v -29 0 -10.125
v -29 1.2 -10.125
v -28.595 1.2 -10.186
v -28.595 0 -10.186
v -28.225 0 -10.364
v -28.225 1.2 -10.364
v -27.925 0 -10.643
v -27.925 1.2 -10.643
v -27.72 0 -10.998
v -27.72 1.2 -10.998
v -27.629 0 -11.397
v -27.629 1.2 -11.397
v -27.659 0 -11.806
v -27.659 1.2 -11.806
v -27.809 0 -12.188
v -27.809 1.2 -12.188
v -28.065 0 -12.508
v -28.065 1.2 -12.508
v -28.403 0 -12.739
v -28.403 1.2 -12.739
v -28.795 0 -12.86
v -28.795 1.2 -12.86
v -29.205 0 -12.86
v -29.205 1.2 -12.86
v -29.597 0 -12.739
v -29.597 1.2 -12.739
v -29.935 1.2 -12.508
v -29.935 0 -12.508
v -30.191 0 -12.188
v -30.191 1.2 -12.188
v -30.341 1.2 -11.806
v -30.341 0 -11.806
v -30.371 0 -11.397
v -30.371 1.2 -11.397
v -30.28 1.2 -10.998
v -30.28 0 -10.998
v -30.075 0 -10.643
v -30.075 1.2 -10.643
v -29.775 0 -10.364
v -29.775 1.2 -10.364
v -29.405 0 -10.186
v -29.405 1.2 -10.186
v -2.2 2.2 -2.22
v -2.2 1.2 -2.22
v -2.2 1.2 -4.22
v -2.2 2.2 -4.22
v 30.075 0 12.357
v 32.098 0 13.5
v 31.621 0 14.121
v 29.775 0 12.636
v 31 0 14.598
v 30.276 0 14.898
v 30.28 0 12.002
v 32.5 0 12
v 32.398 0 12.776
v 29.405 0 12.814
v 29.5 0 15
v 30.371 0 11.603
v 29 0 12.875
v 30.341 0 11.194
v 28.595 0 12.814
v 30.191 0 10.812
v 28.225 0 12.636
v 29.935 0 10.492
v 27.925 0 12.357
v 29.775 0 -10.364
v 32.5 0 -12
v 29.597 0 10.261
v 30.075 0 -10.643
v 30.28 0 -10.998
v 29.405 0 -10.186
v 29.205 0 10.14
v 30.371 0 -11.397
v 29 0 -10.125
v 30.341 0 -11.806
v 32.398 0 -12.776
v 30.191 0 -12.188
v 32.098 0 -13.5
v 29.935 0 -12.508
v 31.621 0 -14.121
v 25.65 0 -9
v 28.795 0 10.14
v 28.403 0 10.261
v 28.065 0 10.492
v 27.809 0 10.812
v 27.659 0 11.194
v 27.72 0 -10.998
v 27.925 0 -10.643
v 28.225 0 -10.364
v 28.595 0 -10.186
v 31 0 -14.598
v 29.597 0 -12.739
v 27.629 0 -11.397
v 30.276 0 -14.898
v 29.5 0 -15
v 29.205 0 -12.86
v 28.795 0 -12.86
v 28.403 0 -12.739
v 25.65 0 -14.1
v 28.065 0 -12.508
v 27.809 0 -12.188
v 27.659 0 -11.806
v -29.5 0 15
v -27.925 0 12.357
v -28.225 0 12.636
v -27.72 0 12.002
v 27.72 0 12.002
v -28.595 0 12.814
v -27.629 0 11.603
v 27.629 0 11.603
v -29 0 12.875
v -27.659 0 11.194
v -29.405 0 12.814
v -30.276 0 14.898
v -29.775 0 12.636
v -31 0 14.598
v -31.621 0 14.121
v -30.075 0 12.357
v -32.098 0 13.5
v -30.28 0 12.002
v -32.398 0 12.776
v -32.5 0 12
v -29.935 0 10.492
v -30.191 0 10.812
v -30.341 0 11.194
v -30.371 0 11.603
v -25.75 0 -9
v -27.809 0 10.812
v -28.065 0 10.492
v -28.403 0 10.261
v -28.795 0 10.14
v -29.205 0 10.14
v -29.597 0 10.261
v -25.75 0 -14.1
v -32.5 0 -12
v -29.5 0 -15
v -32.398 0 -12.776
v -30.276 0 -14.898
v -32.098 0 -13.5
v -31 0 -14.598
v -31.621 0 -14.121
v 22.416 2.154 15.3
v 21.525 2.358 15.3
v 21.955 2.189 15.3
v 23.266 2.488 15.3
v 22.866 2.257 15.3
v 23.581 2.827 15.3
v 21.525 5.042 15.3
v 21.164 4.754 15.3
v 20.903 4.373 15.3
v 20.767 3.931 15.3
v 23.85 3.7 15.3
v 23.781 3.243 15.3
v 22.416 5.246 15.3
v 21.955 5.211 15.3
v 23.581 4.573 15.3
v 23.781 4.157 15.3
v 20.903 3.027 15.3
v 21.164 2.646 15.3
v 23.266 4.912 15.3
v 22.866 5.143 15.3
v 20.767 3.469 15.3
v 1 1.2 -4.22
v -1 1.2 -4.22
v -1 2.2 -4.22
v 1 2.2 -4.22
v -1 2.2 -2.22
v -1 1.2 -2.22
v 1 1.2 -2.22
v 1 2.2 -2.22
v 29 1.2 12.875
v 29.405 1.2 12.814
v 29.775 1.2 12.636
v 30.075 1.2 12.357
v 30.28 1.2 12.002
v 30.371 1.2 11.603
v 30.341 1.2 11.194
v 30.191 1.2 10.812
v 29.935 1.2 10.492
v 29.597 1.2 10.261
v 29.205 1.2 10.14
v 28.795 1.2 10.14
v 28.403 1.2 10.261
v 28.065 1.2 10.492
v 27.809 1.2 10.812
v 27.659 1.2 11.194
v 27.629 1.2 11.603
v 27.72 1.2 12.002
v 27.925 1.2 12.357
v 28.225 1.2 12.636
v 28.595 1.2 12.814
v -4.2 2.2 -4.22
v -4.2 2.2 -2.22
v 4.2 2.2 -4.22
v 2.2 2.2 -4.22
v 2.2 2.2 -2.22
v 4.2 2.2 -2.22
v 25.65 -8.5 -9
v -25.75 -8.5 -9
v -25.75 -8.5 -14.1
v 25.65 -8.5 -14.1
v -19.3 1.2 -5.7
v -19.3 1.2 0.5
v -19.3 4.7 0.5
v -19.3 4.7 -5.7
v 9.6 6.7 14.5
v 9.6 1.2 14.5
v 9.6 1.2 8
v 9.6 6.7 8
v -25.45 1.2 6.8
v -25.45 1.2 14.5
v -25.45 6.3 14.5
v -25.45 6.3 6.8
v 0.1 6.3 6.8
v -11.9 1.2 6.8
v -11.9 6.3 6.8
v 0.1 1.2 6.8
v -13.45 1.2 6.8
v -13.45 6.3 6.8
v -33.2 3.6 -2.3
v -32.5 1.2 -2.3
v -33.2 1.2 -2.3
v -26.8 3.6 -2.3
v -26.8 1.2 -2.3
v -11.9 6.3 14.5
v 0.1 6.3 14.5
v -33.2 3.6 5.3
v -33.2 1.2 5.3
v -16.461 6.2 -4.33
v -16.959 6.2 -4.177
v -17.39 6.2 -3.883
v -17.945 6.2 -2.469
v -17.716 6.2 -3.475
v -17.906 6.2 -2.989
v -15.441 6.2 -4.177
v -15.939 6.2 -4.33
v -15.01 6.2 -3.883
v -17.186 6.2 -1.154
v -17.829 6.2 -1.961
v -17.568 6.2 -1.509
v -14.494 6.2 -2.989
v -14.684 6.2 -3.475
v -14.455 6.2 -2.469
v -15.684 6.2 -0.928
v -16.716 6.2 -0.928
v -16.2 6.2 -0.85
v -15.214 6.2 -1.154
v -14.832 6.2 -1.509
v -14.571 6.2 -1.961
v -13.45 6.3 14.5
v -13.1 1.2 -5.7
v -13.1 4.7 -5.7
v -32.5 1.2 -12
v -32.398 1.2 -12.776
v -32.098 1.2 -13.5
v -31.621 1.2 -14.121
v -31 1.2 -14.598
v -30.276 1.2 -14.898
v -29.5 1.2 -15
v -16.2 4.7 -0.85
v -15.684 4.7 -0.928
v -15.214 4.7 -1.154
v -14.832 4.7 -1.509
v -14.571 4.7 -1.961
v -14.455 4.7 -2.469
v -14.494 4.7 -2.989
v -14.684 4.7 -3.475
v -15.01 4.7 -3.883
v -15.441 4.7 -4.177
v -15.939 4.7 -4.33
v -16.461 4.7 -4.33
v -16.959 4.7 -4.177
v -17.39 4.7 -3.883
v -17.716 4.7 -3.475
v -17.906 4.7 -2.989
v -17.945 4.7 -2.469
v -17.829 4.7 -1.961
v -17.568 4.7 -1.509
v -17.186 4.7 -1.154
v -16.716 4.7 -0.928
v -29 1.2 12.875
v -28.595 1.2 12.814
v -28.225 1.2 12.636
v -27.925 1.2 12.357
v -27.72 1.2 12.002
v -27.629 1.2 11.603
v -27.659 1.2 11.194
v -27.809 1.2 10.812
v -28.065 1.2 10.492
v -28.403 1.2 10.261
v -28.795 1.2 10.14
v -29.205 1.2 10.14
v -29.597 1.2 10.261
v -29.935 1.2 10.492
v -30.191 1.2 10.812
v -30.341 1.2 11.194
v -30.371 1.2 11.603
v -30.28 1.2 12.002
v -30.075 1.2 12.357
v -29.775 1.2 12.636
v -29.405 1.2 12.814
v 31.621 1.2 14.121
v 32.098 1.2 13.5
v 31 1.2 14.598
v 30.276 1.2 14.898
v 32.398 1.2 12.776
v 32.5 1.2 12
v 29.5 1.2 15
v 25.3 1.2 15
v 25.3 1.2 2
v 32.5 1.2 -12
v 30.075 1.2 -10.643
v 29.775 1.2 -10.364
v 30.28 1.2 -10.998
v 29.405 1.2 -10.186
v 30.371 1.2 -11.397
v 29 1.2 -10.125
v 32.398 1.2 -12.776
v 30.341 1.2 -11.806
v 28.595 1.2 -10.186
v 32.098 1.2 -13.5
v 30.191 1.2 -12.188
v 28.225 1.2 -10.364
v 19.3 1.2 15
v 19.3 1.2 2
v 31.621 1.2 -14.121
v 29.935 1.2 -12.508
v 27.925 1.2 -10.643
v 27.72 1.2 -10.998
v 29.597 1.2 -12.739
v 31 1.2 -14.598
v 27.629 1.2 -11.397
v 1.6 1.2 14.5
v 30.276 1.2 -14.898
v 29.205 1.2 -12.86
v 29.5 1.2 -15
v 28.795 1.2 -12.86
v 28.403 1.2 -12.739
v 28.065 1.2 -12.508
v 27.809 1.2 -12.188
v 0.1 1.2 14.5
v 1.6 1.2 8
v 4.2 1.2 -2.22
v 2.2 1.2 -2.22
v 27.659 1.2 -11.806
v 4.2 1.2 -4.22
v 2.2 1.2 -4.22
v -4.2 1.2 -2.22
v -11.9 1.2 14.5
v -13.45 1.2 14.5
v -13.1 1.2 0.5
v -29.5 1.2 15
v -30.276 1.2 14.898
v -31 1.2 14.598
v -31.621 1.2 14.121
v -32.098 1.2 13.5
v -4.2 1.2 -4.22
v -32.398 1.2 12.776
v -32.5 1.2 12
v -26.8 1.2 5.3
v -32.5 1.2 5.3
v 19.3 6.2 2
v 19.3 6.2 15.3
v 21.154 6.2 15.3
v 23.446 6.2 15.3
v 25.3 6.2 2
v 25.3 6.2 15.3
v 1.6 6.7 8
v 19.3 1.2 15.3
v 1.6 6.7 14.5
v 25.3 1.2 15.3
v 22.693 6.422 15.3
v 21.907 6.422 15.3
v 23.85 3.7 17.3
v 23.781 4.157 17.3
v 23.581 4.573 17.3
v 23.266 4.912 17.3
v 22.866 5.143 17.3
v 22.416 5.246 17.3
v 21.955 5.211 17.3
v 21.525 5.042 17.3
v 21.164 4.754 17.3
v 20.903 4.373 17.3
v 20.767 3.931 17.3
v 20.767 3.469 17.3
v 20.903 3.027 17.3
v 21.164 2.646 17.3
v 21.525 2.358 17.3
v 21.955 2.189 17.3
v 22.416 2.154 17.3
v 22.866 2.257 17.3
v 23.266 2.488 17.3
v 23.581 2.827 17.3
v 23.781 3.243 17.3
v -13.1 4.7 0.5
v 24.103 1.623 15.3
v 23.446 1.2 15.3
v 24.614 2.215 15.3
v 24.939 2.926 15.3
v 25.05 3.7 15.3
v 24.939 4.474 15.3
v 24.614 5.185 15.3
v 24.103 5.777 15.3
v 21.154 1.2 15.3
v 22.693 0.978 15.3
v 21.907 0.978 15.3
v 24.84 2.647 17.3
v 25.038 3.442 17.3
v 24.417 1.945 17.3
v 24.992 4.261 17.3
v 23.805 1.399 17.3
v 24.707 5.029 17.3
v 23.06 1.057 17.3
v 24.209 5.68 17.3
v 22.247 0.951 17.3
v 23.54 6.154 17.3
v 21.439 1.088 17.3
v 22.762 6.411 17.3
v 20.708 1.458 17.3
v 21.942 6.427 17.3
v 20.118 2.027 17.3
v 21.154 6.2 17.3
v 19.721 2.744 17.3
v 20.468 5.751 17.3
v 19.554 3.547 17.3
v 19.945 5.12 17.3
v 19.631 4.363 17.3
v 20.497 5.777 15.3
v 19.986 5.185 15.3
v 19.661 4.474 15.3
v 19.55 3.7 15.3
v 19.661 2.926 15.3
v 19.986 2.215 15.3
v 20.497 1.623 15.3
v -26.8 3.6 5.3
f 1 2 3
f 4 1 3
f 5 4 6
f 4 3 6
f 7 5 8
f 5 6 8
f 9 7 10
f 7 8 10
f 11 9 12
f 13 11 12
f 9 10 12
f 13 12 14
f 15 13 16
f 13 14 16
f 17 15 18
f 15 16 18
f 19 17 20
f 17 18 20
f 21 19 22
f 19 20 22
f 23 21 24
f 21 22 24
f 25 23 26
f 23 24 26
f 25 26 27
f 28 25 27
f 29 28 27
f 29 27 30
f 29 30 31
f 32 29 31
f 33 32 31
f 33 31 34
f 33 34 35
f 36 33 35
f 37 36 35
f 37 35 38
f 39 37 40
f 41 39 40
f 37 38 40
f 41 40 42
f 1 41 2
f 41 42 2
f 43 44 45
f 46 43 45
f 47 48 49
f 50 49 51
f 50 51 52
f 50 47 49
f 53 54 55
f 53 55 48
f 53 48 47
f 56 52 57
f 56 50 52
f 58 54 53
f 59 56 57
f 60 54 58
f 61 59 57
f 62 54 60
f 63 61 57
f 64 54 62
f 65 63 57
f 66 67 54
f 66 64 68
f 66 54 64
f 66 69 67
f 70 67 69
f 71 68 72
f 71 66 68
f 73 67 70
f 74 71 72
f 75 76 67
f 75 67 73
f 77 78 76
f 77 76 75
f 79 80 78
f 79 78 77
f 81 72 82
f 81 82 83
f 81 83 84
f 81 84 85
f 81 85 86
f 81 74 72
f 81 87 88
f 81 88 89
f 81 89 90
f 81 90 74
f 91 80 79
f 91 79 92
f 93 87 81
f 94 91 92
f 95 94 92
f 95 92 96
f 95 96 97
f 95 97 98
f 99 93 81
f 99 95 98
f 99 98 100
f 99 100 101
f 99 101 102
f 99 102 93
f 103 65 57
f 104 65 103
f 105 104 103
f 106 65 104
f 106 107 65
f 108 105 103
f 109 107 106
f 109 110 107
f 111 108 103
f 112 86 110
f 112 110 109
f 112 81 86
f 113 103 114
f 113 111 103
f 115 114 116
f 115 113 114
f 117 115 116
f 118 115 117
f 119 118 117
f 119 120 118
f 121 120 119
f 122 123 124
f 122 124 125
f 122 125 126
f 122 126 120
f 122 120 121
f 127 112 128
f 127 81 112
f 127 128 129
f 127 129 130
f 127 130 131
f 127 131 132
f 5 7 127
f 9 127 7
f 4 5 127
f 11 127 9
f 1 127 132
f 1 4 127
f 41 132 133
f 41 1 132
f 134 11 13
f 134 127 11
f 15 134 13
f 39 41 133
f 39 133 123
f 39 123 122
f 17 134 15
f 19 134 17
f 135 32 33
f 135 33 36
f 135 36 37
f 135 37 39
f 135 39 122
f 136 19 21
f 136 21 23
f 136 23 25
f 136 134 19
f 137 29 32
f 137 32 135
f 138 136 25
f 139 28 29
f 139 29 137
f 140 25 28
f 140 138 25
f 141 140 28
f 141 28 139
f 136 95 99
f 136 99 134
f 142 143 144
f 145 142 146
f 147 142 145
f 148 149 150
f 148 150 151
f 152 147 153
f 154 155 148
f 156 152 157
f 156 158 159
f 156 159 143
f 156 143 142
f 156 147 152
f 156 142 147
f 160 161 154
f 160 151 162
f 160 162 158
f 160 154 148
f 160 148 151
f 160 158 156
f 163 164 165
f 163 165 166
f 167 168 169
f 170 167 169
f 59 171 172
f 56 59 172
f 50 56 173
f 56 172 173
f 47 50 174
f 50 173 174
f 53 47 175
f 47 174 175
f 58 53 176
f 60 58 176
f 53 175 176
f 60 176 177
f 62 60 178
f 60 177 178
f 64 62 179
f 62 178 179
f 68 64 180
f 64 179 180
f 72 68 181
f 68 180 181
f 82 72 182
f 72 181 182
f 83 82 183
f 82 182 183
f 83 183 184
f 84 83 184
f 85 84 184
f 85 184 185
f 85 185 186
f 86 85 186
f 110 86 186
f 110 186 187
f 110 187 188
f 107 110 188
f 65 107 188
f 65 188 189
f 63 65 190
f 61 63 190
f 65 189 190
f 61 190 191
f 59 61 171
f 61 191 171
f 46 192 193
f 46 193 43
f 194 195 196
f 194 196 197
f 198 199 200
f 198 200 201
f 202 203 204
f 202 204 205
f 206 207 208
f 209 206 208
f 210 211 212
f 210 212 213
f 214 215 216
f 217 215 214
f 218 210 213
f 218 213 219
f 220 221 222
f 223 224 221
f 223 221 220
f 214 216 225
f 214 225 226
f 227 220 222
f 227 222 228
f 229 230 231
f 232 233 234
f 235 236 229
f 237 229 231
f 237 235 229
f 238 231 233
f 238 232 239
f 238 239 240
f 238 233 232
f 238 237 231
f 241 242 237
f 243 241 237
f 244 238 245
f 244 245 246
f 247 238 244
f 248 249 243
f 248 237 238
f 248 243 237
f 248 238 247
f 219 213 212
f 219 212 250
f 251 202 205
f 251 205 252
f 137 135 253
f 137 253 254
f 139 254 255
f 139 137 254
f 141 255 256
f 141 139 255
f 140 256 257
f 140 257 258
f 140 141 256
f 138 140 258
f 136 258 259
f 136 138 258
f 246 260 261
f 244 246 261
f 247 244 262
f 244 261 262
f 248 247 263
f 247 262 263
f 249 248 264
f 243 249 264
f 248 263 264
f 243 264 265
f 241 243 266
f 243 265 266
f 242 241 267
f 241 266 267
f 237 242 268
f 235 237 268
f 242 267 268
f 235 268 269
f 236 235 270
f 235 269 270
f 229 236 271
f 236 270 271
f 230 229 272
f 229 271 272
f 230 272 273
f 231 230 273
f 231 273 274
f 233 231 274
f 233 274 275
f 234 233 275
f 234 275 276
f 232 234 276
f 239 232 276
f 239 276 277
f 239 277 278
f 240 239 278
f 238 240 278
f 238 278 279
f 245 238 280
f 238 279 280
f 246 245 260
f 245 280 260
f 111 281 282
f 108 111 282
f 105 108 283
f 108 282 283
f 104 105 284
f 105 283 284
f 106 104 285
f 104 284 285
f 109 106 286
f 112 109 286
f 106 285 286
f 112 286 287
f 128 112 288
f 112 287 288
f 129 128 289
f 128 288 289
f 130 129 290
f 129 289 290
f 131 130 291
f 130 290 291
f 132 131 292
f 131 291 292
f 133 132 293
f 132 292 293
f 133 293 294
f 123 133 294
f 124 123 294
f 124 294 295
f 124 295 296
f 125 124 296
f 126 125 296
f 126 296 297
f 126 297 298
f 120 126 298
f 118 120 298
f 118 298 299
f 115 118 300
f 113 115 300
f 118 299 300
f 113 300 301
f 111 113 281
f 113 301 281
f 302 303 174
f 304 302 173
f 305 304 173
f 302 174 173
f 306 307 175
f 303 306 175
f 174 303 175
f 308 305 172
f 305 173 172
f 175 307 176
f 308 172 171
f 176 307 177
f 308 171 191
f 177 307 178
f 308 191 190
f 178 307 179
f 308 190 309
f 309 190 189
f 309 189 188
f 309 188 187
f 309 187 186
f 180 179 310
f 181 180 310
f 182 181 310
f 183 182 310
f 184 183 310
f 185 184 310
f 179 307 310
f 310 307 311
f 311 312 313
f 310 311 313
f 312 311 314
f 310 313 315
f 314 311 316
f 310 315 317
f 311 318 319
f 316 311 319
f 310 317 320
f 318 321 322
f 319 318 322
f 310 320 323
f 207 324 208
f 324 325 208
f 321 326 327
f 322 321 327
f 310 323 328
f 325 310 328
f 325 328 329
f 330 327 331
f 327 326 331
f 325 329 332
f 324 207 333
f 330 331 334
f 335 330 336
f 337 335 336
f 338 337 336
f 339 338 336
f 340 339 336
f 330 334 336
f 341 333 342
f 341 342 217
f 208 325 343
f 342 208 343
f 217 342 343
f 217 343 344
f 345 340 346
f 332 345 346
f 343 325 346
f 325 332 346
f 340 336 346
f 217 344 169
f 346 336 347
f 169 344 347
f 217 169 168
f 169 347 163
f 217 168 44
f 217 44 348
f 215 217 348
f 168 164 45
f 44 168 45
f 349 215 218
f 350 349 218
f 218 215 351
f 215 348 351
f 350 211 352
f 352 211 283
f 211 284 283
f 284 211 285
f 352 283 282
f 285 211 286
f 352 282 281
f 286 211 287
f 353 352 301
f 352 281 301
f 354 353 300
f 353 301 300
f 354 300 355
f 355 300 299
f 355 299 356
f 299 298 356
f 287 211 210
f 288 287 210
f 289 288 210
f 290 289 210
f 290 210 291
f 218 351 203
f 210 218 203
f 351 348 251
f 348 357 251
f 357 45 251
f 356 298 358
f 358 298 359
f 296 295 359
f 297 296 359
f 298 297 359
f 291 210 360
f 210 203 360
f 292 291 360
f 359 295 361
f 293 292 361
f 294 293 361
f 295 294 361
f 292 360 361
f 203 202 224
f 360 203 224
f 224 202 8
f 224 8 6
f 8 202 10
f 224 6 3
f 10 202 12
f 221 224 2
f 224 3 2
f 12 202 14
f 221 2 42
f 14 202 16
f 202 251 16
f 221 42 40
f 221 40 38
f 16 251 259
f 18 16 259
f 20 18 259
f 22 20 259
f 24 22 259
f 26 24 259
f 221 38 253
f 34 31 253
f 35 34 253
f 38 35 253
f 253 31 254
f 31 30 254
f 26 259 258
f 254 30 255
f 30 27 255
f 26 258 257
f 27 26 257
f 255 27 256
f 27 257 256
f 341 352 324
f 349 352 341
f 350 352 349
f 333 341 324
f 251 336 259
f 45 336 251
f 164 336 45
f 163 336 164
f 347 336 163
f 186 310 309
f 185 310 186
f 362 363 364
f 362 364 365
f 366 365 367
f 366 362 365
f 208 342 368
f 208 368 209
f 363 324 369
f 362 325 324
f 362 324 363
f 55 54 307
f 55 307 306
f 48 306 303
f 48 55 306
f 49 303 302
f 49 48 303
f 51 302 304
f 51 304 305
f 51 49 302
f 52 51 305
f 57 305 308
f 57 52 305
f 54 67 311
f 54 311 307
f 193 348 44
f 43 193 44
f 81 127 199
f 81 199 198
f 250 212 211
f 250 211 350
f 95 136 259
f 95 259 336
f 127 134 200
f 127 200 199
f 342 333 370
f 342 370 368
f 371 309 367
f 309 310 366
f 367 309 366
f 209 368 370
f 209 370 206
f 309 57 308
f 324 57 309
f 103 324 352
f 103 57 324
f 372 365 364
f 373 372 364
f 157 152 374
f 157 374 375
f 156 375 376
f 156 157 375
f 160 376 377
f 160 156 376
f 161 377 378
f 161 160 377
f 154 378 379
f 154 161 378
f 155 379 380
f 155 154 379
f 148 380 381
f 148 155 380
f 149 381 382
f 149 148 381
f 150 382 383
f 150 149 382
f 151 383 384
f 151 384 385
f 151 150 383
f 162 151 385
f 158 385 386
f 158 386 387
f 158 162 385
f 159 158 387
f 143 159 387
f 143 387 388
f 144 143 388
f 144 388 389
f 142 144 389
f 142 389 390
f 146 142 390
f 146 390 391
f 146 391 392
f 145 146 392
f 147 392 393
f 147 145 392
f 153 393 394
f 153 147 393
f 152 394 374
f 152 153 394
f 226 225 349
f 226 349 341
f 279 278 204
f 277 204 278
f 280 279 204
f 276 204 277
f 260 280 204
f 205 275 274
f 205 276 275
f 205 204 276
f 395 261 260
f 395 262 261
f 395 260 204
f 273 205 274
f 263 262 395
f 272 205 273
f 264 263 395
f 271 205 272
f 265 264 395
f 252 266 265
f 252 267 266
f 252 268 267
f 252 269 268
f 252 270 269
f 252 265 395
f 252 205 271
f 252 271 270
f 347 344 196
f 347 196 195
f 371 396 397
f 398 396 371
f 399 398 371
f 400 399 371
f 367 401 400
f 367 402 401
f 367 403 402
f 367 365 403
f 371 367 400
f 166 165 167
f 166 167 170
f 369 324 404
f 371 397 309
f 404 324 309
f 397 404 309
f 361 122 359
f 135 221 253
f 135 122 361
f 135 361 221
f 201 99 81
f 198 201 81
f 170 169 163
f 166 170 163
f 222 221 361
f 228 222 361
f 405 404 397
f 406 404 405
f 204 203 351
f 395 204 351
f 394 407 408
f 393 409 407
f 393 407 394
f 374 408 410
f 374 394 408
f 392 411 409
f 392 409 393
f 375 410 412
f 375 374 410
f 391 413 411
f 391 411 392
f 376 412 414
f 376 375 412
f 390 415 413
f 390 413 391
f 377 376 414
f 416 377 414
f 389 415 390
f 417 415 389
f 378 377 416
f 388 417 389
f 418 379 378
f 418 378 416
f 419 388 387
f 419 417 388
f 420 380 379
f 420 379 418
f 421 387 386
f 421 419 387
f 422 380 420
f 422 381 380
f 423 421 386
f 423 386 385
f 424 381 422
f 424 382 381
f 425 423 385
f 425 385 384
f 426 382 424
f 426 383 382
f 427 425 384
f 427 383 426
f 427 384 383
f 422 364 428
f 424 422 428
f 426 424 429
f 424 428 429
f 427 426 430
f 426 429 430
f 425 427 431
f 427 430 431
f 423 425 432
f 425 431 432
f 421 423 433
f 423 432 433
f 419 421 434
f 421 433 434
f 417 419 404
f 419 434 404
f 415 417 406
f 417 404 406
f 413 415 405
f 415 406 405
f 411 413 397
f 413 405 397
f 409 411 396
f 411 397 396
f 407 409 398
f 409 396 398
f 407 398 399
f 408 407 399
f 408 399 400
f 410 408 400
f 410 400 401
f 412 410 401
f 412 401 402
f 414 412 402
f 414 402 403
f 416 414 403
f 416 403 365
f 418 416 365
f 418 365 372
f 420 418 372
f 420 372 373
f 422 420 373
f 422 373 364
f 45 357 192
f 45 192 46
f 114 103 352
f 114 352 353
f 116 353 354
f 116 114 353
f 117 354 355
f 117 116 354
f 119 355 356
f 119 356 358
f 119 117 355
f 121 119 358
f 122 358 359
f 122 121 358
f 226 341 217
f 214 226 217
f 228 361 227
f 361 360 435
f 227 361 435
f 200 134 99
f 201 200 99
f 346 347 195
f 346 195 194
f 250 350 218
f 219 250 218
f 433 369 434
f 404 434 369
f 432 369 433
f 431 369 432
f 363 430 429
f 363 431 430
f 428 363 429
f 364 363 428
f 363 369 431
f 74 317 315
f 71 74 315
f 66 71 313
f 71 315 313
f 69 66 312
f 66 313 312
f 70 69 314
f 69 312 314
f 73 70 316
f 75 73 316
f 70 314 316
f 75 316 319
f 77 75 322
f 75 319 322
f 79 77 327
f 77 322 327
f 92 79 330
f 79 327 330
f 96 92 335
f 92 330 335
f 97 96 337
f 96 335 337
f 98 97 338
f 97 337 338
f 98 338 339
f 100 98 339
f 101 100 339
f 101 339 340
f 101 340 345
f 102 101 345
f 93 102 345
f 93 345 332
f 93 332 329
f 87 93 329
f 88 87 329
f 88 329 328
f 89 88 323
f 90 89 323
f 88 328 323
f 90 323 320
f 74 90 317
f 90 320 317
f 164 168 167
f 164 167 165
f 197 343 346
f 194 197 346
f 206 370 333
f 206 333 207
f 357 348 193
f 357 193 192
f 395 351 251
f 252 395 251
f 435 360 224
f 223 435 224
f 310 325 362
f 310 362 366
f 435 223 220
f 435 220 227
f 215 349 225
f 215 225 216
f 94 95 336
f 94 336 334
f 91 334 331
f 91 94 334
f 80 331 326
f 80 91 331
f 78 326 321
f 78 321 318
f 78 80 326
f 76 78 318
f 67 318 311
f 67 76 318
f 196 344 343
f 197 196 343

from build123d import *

# Parameters (mm, degrees)
EXTRUDE_1_DEPTH     = 1.2
SKETCH_2_R          = 1.375
CUT_EXTRUDE_1_DEPTH = 1.2
SKETCH_3_W          = 6
SKETCH_3_H          = 13
EXTRUDE_2_DEPTH     = 5
SKETCH_4_W          = 6
SKETCH_4_H          = 5
EXTRUDE_3_DEPTH     = 0.3
SKETCH_5_W          = 8
SKETCH_5_H          = 7
EXTRUDE_4_DEPTH     = 5.5
SKETCH_6_W          = 12
SKETCH_6_H          = 8.2
EXTRUDE_5_DEPTH     = 5.1
SKETCH_7_W          = 12
SKETCH_7_H          = 8.2
EXTRUDE_6_DEPTH     = 5.1
SKETCH_8_W          = 5.7
SKETCH_8_H          = 7.6
EXTRUDE_7_DEPTH     = 2.4
SKETCH_9_W          = 7.6
SKETCH_9_H          = 2.4
EXTRUDE_8_DEPTH     = 0.7
SKETCH_10_W         = 12
SKETCH_10_H         = 5.1
SKETCH_10_W_2       = 8
SKETCH_10_H_2       = 5.5
CUT_EXTRUDE_2_DEPTH = 0.5
SKETCH_11_W         = 51.4
SKETCH_11_H         = 5.1
EXTRUDE_9_DEPTH     = 8.5
SKETCH_12_W         = 6.2
SKETCH_12_H         = 6.2
EXTRUDE_10_DEPTH    = 3.5
SKETCH_13_R         = 1.75
EXTRUDE_11_DEPTH    = 1.5
SKETCH_14_W         = 2
SKETCH_14_H         = 2
EXTRUDE_12_DEPTH    = 1
SKETCH_15_R         = 2.75
SKETCH_15_R_2       = 1.55
EXTRUDE_13_DEPTH    = 2


with BuildPart() as part:
    # 草图1 → 凸台-拉伸1 (new body)
    with BuildSketch(Plane(origin=(0, 0, 0), x_dir=(1, 0, 0), z_dir=(0, 1, 0))):
        with BuildLine():
            Line((-29.5, 15), (29.5, 15))
            ThreePointArc((29.5, 15), (31.621320344, 14.121320344), (32.5, 12))
            Line((32.5, 12), (32.5, -12))
            ThreePointArc((32.5, -12), (31.621320344, -14.121320344), (29.5, -15))
            Line((29.5, -15), (-29.5, -15))
            ThreePointArc((-29.5, -15), (-31.621320344, -14.121320344), (-32.5, -12))
            Line((-32.5, -12), (-32.5, 12))
            ThreePointArc((-32.5, 12), (-31.621320344, 14.121320344), (-29.5, 15))
        make_face()
    extrude(amount=EXTRUDE_1_DEPTH)

    # 草图2 → 切除-拉伸1 (cut)
    with BuildSketch(Plane(origin=(0, 1.2, 0), x_dir=(1, 0, 0), z_dir=(0, 1, 0))):
        with Locations(Location((29, -11.5, 0), (0, 0, 270))):
            Circle(SKETCH_2_R)
        with Locations(Location((29, 11.5, 0), (0, 0, 270))):
            Circle(SKETCH_2_R)
        with Locations(Location((-29, -11.5, 0), (0, 0, 270))):
            Circle(SKETCH_2_R)
        with Locations(Location((-29, 11.5, 0), (0, 0, 270))):
            Circle(SKETCH_2_R)
    extrude(amount=-CUT_EXTRUDE_1_DEPTH, mode=Mode.SUBTRACT)

    # 草图3 → 凸台-拉伸2 (add)
    with BuildSketch(Plane(origin=(0, 1.2, 0), x_dir=(1, 0, 0), z_dir=(0, 1, 0))):
        with Locations((22.3, -8.5)):
            Rectangle(SKETCH_3_W, SKETCH_3_H)
    extrude(amount=EXTRUDE_2_DEPTH)

    # 草图4 → 凸台-拉伸3 (add)
    with BuildSketch(Plane.XY.offset(15)):
        with Locations((22.3, 3.7)):
            Rectangle(SKETCH_4_W, SKETCH_4_H)
    extrude(amount=EXTRUDE_3_DEPTH)

    # 草图5 → 凸台-拉伸4 (add)
    with BuildSketch(Plane(origin=(0, 1.2, 0), x_dir=(1, 0, 0), z_dir=(0, 1, 0))):
        with Locations((5.6, -11.5)):
            Rectangle(SKETCH_5_W, SKETCH_5_H)
    extrude(amount=EXTRUDE_4_DEPTH)

    # 草图6 → 凸台-拉伸5 (add)
    with BuildSketch(Plane(origin=(0, 1.2, 0), x_dir=(1, 0, 0), z_dir=(0, 1, 0))):
        with Locations((-5.9, -10.9)):
            Rectangle(SKETCH_6_W, SKETCH_6_H)
    extrude(amount=EXTRUDE_5_DEPTH)

    # 草图7 → 凸台-拉伸6 (add)
    with BuildSketch(Plane(origin=(0, 1.2, 0), x_dir=(1, 0, 0), z_dir=(0, 1, 0))):
        with Locations((-19.45, -10.9)):
            Rectangle(SKETCH_7_W, SKETCH_7_H)
    extrude(amount=EXTRUDE_6_DEPTH)

    # 草图8 → 凸台-拉伸7 (add)
    with BuildSketch(Plane(origin=(0, 1.2, 0), x_dir=(1, 0, 0), z_dir=(0, 1, 0))):
        with Locations((-29.65, -1.5)):
            Rectangle(SKETCH_8_W, SKETCH_8_H)
    extrude(amount=EXTRUDE_7_DEPTH)

    # 草图9 → 凸台-拉伸8 (add)
    with BuildSketch(Plane.ZY.offset(32.5)):
        with Locations((1.5, 2.4)):
            Rectangle(SKETCH_9_W, SKETCH_9_H)
    extrude(amount=EXTRUDE_8_DEPTH)

    # 草图10 → 切除-拉伸2 (cut)
    with BuildSketch(Plane.XY.offset(15)):
        with Locations((-19.45, 3.75)):
            Rectangle(SKETCH_10_W, SKETCH_10_H)
        with Locations((-5.9, 3.75)):
            Rectangle(SKETCH_10_W, SKETCH_10_H)
        with Locations((5.6, 3.95)):
            Rectangle(SKETCH_10_W_2, SKETCH_10_H_2)
    extrude(amount=-CUT_EXTRUDE_2_DEPTH, mode=Mode.SUBTRACT)

    # 草图11 → 凸台-拉伸9 (add)
    with BuildSketch(Plane.XZ):
        with Locations((-0.05, -11.55)):
            Rectangle(SKETCH_11_W, SKETCH_11_H)
    extrude(amount=EXTRUDE_9_DEPTH)

    # 草图12 → 凸台-拉伸10 (add)
    with BuildSketch(Plane(origin=(0, 1.2, 0), x_dir=(1, 0, 0), z_dir=(0, 1, 0))):
        with Locations((-16.2, 2.6)):
            Rectangle(SKETCH_12_W, SKETCH_12_H)
    extrude(amount=EXTRUDE_10_DEPTH)

    # 草图13 → 凸台-拉伸11 (add)
    with BuildSketch(Plane(origin=(0, 4.7, 0), x_dir=(1, 0, 0), z_dir=(0, 1, 0))):
        with Locations(Location((-16.2, 2.6, 0), (0, 0, 270))):
            Circle(SKETCH_13_R)
    extrude(amount=EXTRUDE_11_DEPTH)

    # 草图14 → 凸台-拉伸12 (add)
    with BuildSketch(Plane(origin=(0, 1.2, 0), x_dir=(1, 0, 0), z_dir=(0, 1, 0))):
        with Locations((3.2, 3.22)):
            Rectangle(SKETCH_14_W, SKETCH_14_H)
        with Locations((0, 3.22)):
            Rectangle(SKETCH_14_W, SKETCH_14_H)
        with Locations((-3.2, 3.22)):
            Rectangle(SKETCH_14_W, SKETCH_14_H)
    extrude(amount=EXTRUDE_12_DEPTH)

    # 草图15 → 凸台-拉伸13 (add)
    with BuildSketch(Plane.XY.offset(15.3)):
        with Locations(Location((22.3, 3.7, 0), (0, 0, 114.619977329))):
            Circle(SKETCH_15_R)
        with Locations((22.3, 3.7)):
            Circle(SKETCH_15_R_2, mode=Mode.SUBTRACT)
    extrude(amount=EXTRUDE_13_DEPTH)


solid = part.part
